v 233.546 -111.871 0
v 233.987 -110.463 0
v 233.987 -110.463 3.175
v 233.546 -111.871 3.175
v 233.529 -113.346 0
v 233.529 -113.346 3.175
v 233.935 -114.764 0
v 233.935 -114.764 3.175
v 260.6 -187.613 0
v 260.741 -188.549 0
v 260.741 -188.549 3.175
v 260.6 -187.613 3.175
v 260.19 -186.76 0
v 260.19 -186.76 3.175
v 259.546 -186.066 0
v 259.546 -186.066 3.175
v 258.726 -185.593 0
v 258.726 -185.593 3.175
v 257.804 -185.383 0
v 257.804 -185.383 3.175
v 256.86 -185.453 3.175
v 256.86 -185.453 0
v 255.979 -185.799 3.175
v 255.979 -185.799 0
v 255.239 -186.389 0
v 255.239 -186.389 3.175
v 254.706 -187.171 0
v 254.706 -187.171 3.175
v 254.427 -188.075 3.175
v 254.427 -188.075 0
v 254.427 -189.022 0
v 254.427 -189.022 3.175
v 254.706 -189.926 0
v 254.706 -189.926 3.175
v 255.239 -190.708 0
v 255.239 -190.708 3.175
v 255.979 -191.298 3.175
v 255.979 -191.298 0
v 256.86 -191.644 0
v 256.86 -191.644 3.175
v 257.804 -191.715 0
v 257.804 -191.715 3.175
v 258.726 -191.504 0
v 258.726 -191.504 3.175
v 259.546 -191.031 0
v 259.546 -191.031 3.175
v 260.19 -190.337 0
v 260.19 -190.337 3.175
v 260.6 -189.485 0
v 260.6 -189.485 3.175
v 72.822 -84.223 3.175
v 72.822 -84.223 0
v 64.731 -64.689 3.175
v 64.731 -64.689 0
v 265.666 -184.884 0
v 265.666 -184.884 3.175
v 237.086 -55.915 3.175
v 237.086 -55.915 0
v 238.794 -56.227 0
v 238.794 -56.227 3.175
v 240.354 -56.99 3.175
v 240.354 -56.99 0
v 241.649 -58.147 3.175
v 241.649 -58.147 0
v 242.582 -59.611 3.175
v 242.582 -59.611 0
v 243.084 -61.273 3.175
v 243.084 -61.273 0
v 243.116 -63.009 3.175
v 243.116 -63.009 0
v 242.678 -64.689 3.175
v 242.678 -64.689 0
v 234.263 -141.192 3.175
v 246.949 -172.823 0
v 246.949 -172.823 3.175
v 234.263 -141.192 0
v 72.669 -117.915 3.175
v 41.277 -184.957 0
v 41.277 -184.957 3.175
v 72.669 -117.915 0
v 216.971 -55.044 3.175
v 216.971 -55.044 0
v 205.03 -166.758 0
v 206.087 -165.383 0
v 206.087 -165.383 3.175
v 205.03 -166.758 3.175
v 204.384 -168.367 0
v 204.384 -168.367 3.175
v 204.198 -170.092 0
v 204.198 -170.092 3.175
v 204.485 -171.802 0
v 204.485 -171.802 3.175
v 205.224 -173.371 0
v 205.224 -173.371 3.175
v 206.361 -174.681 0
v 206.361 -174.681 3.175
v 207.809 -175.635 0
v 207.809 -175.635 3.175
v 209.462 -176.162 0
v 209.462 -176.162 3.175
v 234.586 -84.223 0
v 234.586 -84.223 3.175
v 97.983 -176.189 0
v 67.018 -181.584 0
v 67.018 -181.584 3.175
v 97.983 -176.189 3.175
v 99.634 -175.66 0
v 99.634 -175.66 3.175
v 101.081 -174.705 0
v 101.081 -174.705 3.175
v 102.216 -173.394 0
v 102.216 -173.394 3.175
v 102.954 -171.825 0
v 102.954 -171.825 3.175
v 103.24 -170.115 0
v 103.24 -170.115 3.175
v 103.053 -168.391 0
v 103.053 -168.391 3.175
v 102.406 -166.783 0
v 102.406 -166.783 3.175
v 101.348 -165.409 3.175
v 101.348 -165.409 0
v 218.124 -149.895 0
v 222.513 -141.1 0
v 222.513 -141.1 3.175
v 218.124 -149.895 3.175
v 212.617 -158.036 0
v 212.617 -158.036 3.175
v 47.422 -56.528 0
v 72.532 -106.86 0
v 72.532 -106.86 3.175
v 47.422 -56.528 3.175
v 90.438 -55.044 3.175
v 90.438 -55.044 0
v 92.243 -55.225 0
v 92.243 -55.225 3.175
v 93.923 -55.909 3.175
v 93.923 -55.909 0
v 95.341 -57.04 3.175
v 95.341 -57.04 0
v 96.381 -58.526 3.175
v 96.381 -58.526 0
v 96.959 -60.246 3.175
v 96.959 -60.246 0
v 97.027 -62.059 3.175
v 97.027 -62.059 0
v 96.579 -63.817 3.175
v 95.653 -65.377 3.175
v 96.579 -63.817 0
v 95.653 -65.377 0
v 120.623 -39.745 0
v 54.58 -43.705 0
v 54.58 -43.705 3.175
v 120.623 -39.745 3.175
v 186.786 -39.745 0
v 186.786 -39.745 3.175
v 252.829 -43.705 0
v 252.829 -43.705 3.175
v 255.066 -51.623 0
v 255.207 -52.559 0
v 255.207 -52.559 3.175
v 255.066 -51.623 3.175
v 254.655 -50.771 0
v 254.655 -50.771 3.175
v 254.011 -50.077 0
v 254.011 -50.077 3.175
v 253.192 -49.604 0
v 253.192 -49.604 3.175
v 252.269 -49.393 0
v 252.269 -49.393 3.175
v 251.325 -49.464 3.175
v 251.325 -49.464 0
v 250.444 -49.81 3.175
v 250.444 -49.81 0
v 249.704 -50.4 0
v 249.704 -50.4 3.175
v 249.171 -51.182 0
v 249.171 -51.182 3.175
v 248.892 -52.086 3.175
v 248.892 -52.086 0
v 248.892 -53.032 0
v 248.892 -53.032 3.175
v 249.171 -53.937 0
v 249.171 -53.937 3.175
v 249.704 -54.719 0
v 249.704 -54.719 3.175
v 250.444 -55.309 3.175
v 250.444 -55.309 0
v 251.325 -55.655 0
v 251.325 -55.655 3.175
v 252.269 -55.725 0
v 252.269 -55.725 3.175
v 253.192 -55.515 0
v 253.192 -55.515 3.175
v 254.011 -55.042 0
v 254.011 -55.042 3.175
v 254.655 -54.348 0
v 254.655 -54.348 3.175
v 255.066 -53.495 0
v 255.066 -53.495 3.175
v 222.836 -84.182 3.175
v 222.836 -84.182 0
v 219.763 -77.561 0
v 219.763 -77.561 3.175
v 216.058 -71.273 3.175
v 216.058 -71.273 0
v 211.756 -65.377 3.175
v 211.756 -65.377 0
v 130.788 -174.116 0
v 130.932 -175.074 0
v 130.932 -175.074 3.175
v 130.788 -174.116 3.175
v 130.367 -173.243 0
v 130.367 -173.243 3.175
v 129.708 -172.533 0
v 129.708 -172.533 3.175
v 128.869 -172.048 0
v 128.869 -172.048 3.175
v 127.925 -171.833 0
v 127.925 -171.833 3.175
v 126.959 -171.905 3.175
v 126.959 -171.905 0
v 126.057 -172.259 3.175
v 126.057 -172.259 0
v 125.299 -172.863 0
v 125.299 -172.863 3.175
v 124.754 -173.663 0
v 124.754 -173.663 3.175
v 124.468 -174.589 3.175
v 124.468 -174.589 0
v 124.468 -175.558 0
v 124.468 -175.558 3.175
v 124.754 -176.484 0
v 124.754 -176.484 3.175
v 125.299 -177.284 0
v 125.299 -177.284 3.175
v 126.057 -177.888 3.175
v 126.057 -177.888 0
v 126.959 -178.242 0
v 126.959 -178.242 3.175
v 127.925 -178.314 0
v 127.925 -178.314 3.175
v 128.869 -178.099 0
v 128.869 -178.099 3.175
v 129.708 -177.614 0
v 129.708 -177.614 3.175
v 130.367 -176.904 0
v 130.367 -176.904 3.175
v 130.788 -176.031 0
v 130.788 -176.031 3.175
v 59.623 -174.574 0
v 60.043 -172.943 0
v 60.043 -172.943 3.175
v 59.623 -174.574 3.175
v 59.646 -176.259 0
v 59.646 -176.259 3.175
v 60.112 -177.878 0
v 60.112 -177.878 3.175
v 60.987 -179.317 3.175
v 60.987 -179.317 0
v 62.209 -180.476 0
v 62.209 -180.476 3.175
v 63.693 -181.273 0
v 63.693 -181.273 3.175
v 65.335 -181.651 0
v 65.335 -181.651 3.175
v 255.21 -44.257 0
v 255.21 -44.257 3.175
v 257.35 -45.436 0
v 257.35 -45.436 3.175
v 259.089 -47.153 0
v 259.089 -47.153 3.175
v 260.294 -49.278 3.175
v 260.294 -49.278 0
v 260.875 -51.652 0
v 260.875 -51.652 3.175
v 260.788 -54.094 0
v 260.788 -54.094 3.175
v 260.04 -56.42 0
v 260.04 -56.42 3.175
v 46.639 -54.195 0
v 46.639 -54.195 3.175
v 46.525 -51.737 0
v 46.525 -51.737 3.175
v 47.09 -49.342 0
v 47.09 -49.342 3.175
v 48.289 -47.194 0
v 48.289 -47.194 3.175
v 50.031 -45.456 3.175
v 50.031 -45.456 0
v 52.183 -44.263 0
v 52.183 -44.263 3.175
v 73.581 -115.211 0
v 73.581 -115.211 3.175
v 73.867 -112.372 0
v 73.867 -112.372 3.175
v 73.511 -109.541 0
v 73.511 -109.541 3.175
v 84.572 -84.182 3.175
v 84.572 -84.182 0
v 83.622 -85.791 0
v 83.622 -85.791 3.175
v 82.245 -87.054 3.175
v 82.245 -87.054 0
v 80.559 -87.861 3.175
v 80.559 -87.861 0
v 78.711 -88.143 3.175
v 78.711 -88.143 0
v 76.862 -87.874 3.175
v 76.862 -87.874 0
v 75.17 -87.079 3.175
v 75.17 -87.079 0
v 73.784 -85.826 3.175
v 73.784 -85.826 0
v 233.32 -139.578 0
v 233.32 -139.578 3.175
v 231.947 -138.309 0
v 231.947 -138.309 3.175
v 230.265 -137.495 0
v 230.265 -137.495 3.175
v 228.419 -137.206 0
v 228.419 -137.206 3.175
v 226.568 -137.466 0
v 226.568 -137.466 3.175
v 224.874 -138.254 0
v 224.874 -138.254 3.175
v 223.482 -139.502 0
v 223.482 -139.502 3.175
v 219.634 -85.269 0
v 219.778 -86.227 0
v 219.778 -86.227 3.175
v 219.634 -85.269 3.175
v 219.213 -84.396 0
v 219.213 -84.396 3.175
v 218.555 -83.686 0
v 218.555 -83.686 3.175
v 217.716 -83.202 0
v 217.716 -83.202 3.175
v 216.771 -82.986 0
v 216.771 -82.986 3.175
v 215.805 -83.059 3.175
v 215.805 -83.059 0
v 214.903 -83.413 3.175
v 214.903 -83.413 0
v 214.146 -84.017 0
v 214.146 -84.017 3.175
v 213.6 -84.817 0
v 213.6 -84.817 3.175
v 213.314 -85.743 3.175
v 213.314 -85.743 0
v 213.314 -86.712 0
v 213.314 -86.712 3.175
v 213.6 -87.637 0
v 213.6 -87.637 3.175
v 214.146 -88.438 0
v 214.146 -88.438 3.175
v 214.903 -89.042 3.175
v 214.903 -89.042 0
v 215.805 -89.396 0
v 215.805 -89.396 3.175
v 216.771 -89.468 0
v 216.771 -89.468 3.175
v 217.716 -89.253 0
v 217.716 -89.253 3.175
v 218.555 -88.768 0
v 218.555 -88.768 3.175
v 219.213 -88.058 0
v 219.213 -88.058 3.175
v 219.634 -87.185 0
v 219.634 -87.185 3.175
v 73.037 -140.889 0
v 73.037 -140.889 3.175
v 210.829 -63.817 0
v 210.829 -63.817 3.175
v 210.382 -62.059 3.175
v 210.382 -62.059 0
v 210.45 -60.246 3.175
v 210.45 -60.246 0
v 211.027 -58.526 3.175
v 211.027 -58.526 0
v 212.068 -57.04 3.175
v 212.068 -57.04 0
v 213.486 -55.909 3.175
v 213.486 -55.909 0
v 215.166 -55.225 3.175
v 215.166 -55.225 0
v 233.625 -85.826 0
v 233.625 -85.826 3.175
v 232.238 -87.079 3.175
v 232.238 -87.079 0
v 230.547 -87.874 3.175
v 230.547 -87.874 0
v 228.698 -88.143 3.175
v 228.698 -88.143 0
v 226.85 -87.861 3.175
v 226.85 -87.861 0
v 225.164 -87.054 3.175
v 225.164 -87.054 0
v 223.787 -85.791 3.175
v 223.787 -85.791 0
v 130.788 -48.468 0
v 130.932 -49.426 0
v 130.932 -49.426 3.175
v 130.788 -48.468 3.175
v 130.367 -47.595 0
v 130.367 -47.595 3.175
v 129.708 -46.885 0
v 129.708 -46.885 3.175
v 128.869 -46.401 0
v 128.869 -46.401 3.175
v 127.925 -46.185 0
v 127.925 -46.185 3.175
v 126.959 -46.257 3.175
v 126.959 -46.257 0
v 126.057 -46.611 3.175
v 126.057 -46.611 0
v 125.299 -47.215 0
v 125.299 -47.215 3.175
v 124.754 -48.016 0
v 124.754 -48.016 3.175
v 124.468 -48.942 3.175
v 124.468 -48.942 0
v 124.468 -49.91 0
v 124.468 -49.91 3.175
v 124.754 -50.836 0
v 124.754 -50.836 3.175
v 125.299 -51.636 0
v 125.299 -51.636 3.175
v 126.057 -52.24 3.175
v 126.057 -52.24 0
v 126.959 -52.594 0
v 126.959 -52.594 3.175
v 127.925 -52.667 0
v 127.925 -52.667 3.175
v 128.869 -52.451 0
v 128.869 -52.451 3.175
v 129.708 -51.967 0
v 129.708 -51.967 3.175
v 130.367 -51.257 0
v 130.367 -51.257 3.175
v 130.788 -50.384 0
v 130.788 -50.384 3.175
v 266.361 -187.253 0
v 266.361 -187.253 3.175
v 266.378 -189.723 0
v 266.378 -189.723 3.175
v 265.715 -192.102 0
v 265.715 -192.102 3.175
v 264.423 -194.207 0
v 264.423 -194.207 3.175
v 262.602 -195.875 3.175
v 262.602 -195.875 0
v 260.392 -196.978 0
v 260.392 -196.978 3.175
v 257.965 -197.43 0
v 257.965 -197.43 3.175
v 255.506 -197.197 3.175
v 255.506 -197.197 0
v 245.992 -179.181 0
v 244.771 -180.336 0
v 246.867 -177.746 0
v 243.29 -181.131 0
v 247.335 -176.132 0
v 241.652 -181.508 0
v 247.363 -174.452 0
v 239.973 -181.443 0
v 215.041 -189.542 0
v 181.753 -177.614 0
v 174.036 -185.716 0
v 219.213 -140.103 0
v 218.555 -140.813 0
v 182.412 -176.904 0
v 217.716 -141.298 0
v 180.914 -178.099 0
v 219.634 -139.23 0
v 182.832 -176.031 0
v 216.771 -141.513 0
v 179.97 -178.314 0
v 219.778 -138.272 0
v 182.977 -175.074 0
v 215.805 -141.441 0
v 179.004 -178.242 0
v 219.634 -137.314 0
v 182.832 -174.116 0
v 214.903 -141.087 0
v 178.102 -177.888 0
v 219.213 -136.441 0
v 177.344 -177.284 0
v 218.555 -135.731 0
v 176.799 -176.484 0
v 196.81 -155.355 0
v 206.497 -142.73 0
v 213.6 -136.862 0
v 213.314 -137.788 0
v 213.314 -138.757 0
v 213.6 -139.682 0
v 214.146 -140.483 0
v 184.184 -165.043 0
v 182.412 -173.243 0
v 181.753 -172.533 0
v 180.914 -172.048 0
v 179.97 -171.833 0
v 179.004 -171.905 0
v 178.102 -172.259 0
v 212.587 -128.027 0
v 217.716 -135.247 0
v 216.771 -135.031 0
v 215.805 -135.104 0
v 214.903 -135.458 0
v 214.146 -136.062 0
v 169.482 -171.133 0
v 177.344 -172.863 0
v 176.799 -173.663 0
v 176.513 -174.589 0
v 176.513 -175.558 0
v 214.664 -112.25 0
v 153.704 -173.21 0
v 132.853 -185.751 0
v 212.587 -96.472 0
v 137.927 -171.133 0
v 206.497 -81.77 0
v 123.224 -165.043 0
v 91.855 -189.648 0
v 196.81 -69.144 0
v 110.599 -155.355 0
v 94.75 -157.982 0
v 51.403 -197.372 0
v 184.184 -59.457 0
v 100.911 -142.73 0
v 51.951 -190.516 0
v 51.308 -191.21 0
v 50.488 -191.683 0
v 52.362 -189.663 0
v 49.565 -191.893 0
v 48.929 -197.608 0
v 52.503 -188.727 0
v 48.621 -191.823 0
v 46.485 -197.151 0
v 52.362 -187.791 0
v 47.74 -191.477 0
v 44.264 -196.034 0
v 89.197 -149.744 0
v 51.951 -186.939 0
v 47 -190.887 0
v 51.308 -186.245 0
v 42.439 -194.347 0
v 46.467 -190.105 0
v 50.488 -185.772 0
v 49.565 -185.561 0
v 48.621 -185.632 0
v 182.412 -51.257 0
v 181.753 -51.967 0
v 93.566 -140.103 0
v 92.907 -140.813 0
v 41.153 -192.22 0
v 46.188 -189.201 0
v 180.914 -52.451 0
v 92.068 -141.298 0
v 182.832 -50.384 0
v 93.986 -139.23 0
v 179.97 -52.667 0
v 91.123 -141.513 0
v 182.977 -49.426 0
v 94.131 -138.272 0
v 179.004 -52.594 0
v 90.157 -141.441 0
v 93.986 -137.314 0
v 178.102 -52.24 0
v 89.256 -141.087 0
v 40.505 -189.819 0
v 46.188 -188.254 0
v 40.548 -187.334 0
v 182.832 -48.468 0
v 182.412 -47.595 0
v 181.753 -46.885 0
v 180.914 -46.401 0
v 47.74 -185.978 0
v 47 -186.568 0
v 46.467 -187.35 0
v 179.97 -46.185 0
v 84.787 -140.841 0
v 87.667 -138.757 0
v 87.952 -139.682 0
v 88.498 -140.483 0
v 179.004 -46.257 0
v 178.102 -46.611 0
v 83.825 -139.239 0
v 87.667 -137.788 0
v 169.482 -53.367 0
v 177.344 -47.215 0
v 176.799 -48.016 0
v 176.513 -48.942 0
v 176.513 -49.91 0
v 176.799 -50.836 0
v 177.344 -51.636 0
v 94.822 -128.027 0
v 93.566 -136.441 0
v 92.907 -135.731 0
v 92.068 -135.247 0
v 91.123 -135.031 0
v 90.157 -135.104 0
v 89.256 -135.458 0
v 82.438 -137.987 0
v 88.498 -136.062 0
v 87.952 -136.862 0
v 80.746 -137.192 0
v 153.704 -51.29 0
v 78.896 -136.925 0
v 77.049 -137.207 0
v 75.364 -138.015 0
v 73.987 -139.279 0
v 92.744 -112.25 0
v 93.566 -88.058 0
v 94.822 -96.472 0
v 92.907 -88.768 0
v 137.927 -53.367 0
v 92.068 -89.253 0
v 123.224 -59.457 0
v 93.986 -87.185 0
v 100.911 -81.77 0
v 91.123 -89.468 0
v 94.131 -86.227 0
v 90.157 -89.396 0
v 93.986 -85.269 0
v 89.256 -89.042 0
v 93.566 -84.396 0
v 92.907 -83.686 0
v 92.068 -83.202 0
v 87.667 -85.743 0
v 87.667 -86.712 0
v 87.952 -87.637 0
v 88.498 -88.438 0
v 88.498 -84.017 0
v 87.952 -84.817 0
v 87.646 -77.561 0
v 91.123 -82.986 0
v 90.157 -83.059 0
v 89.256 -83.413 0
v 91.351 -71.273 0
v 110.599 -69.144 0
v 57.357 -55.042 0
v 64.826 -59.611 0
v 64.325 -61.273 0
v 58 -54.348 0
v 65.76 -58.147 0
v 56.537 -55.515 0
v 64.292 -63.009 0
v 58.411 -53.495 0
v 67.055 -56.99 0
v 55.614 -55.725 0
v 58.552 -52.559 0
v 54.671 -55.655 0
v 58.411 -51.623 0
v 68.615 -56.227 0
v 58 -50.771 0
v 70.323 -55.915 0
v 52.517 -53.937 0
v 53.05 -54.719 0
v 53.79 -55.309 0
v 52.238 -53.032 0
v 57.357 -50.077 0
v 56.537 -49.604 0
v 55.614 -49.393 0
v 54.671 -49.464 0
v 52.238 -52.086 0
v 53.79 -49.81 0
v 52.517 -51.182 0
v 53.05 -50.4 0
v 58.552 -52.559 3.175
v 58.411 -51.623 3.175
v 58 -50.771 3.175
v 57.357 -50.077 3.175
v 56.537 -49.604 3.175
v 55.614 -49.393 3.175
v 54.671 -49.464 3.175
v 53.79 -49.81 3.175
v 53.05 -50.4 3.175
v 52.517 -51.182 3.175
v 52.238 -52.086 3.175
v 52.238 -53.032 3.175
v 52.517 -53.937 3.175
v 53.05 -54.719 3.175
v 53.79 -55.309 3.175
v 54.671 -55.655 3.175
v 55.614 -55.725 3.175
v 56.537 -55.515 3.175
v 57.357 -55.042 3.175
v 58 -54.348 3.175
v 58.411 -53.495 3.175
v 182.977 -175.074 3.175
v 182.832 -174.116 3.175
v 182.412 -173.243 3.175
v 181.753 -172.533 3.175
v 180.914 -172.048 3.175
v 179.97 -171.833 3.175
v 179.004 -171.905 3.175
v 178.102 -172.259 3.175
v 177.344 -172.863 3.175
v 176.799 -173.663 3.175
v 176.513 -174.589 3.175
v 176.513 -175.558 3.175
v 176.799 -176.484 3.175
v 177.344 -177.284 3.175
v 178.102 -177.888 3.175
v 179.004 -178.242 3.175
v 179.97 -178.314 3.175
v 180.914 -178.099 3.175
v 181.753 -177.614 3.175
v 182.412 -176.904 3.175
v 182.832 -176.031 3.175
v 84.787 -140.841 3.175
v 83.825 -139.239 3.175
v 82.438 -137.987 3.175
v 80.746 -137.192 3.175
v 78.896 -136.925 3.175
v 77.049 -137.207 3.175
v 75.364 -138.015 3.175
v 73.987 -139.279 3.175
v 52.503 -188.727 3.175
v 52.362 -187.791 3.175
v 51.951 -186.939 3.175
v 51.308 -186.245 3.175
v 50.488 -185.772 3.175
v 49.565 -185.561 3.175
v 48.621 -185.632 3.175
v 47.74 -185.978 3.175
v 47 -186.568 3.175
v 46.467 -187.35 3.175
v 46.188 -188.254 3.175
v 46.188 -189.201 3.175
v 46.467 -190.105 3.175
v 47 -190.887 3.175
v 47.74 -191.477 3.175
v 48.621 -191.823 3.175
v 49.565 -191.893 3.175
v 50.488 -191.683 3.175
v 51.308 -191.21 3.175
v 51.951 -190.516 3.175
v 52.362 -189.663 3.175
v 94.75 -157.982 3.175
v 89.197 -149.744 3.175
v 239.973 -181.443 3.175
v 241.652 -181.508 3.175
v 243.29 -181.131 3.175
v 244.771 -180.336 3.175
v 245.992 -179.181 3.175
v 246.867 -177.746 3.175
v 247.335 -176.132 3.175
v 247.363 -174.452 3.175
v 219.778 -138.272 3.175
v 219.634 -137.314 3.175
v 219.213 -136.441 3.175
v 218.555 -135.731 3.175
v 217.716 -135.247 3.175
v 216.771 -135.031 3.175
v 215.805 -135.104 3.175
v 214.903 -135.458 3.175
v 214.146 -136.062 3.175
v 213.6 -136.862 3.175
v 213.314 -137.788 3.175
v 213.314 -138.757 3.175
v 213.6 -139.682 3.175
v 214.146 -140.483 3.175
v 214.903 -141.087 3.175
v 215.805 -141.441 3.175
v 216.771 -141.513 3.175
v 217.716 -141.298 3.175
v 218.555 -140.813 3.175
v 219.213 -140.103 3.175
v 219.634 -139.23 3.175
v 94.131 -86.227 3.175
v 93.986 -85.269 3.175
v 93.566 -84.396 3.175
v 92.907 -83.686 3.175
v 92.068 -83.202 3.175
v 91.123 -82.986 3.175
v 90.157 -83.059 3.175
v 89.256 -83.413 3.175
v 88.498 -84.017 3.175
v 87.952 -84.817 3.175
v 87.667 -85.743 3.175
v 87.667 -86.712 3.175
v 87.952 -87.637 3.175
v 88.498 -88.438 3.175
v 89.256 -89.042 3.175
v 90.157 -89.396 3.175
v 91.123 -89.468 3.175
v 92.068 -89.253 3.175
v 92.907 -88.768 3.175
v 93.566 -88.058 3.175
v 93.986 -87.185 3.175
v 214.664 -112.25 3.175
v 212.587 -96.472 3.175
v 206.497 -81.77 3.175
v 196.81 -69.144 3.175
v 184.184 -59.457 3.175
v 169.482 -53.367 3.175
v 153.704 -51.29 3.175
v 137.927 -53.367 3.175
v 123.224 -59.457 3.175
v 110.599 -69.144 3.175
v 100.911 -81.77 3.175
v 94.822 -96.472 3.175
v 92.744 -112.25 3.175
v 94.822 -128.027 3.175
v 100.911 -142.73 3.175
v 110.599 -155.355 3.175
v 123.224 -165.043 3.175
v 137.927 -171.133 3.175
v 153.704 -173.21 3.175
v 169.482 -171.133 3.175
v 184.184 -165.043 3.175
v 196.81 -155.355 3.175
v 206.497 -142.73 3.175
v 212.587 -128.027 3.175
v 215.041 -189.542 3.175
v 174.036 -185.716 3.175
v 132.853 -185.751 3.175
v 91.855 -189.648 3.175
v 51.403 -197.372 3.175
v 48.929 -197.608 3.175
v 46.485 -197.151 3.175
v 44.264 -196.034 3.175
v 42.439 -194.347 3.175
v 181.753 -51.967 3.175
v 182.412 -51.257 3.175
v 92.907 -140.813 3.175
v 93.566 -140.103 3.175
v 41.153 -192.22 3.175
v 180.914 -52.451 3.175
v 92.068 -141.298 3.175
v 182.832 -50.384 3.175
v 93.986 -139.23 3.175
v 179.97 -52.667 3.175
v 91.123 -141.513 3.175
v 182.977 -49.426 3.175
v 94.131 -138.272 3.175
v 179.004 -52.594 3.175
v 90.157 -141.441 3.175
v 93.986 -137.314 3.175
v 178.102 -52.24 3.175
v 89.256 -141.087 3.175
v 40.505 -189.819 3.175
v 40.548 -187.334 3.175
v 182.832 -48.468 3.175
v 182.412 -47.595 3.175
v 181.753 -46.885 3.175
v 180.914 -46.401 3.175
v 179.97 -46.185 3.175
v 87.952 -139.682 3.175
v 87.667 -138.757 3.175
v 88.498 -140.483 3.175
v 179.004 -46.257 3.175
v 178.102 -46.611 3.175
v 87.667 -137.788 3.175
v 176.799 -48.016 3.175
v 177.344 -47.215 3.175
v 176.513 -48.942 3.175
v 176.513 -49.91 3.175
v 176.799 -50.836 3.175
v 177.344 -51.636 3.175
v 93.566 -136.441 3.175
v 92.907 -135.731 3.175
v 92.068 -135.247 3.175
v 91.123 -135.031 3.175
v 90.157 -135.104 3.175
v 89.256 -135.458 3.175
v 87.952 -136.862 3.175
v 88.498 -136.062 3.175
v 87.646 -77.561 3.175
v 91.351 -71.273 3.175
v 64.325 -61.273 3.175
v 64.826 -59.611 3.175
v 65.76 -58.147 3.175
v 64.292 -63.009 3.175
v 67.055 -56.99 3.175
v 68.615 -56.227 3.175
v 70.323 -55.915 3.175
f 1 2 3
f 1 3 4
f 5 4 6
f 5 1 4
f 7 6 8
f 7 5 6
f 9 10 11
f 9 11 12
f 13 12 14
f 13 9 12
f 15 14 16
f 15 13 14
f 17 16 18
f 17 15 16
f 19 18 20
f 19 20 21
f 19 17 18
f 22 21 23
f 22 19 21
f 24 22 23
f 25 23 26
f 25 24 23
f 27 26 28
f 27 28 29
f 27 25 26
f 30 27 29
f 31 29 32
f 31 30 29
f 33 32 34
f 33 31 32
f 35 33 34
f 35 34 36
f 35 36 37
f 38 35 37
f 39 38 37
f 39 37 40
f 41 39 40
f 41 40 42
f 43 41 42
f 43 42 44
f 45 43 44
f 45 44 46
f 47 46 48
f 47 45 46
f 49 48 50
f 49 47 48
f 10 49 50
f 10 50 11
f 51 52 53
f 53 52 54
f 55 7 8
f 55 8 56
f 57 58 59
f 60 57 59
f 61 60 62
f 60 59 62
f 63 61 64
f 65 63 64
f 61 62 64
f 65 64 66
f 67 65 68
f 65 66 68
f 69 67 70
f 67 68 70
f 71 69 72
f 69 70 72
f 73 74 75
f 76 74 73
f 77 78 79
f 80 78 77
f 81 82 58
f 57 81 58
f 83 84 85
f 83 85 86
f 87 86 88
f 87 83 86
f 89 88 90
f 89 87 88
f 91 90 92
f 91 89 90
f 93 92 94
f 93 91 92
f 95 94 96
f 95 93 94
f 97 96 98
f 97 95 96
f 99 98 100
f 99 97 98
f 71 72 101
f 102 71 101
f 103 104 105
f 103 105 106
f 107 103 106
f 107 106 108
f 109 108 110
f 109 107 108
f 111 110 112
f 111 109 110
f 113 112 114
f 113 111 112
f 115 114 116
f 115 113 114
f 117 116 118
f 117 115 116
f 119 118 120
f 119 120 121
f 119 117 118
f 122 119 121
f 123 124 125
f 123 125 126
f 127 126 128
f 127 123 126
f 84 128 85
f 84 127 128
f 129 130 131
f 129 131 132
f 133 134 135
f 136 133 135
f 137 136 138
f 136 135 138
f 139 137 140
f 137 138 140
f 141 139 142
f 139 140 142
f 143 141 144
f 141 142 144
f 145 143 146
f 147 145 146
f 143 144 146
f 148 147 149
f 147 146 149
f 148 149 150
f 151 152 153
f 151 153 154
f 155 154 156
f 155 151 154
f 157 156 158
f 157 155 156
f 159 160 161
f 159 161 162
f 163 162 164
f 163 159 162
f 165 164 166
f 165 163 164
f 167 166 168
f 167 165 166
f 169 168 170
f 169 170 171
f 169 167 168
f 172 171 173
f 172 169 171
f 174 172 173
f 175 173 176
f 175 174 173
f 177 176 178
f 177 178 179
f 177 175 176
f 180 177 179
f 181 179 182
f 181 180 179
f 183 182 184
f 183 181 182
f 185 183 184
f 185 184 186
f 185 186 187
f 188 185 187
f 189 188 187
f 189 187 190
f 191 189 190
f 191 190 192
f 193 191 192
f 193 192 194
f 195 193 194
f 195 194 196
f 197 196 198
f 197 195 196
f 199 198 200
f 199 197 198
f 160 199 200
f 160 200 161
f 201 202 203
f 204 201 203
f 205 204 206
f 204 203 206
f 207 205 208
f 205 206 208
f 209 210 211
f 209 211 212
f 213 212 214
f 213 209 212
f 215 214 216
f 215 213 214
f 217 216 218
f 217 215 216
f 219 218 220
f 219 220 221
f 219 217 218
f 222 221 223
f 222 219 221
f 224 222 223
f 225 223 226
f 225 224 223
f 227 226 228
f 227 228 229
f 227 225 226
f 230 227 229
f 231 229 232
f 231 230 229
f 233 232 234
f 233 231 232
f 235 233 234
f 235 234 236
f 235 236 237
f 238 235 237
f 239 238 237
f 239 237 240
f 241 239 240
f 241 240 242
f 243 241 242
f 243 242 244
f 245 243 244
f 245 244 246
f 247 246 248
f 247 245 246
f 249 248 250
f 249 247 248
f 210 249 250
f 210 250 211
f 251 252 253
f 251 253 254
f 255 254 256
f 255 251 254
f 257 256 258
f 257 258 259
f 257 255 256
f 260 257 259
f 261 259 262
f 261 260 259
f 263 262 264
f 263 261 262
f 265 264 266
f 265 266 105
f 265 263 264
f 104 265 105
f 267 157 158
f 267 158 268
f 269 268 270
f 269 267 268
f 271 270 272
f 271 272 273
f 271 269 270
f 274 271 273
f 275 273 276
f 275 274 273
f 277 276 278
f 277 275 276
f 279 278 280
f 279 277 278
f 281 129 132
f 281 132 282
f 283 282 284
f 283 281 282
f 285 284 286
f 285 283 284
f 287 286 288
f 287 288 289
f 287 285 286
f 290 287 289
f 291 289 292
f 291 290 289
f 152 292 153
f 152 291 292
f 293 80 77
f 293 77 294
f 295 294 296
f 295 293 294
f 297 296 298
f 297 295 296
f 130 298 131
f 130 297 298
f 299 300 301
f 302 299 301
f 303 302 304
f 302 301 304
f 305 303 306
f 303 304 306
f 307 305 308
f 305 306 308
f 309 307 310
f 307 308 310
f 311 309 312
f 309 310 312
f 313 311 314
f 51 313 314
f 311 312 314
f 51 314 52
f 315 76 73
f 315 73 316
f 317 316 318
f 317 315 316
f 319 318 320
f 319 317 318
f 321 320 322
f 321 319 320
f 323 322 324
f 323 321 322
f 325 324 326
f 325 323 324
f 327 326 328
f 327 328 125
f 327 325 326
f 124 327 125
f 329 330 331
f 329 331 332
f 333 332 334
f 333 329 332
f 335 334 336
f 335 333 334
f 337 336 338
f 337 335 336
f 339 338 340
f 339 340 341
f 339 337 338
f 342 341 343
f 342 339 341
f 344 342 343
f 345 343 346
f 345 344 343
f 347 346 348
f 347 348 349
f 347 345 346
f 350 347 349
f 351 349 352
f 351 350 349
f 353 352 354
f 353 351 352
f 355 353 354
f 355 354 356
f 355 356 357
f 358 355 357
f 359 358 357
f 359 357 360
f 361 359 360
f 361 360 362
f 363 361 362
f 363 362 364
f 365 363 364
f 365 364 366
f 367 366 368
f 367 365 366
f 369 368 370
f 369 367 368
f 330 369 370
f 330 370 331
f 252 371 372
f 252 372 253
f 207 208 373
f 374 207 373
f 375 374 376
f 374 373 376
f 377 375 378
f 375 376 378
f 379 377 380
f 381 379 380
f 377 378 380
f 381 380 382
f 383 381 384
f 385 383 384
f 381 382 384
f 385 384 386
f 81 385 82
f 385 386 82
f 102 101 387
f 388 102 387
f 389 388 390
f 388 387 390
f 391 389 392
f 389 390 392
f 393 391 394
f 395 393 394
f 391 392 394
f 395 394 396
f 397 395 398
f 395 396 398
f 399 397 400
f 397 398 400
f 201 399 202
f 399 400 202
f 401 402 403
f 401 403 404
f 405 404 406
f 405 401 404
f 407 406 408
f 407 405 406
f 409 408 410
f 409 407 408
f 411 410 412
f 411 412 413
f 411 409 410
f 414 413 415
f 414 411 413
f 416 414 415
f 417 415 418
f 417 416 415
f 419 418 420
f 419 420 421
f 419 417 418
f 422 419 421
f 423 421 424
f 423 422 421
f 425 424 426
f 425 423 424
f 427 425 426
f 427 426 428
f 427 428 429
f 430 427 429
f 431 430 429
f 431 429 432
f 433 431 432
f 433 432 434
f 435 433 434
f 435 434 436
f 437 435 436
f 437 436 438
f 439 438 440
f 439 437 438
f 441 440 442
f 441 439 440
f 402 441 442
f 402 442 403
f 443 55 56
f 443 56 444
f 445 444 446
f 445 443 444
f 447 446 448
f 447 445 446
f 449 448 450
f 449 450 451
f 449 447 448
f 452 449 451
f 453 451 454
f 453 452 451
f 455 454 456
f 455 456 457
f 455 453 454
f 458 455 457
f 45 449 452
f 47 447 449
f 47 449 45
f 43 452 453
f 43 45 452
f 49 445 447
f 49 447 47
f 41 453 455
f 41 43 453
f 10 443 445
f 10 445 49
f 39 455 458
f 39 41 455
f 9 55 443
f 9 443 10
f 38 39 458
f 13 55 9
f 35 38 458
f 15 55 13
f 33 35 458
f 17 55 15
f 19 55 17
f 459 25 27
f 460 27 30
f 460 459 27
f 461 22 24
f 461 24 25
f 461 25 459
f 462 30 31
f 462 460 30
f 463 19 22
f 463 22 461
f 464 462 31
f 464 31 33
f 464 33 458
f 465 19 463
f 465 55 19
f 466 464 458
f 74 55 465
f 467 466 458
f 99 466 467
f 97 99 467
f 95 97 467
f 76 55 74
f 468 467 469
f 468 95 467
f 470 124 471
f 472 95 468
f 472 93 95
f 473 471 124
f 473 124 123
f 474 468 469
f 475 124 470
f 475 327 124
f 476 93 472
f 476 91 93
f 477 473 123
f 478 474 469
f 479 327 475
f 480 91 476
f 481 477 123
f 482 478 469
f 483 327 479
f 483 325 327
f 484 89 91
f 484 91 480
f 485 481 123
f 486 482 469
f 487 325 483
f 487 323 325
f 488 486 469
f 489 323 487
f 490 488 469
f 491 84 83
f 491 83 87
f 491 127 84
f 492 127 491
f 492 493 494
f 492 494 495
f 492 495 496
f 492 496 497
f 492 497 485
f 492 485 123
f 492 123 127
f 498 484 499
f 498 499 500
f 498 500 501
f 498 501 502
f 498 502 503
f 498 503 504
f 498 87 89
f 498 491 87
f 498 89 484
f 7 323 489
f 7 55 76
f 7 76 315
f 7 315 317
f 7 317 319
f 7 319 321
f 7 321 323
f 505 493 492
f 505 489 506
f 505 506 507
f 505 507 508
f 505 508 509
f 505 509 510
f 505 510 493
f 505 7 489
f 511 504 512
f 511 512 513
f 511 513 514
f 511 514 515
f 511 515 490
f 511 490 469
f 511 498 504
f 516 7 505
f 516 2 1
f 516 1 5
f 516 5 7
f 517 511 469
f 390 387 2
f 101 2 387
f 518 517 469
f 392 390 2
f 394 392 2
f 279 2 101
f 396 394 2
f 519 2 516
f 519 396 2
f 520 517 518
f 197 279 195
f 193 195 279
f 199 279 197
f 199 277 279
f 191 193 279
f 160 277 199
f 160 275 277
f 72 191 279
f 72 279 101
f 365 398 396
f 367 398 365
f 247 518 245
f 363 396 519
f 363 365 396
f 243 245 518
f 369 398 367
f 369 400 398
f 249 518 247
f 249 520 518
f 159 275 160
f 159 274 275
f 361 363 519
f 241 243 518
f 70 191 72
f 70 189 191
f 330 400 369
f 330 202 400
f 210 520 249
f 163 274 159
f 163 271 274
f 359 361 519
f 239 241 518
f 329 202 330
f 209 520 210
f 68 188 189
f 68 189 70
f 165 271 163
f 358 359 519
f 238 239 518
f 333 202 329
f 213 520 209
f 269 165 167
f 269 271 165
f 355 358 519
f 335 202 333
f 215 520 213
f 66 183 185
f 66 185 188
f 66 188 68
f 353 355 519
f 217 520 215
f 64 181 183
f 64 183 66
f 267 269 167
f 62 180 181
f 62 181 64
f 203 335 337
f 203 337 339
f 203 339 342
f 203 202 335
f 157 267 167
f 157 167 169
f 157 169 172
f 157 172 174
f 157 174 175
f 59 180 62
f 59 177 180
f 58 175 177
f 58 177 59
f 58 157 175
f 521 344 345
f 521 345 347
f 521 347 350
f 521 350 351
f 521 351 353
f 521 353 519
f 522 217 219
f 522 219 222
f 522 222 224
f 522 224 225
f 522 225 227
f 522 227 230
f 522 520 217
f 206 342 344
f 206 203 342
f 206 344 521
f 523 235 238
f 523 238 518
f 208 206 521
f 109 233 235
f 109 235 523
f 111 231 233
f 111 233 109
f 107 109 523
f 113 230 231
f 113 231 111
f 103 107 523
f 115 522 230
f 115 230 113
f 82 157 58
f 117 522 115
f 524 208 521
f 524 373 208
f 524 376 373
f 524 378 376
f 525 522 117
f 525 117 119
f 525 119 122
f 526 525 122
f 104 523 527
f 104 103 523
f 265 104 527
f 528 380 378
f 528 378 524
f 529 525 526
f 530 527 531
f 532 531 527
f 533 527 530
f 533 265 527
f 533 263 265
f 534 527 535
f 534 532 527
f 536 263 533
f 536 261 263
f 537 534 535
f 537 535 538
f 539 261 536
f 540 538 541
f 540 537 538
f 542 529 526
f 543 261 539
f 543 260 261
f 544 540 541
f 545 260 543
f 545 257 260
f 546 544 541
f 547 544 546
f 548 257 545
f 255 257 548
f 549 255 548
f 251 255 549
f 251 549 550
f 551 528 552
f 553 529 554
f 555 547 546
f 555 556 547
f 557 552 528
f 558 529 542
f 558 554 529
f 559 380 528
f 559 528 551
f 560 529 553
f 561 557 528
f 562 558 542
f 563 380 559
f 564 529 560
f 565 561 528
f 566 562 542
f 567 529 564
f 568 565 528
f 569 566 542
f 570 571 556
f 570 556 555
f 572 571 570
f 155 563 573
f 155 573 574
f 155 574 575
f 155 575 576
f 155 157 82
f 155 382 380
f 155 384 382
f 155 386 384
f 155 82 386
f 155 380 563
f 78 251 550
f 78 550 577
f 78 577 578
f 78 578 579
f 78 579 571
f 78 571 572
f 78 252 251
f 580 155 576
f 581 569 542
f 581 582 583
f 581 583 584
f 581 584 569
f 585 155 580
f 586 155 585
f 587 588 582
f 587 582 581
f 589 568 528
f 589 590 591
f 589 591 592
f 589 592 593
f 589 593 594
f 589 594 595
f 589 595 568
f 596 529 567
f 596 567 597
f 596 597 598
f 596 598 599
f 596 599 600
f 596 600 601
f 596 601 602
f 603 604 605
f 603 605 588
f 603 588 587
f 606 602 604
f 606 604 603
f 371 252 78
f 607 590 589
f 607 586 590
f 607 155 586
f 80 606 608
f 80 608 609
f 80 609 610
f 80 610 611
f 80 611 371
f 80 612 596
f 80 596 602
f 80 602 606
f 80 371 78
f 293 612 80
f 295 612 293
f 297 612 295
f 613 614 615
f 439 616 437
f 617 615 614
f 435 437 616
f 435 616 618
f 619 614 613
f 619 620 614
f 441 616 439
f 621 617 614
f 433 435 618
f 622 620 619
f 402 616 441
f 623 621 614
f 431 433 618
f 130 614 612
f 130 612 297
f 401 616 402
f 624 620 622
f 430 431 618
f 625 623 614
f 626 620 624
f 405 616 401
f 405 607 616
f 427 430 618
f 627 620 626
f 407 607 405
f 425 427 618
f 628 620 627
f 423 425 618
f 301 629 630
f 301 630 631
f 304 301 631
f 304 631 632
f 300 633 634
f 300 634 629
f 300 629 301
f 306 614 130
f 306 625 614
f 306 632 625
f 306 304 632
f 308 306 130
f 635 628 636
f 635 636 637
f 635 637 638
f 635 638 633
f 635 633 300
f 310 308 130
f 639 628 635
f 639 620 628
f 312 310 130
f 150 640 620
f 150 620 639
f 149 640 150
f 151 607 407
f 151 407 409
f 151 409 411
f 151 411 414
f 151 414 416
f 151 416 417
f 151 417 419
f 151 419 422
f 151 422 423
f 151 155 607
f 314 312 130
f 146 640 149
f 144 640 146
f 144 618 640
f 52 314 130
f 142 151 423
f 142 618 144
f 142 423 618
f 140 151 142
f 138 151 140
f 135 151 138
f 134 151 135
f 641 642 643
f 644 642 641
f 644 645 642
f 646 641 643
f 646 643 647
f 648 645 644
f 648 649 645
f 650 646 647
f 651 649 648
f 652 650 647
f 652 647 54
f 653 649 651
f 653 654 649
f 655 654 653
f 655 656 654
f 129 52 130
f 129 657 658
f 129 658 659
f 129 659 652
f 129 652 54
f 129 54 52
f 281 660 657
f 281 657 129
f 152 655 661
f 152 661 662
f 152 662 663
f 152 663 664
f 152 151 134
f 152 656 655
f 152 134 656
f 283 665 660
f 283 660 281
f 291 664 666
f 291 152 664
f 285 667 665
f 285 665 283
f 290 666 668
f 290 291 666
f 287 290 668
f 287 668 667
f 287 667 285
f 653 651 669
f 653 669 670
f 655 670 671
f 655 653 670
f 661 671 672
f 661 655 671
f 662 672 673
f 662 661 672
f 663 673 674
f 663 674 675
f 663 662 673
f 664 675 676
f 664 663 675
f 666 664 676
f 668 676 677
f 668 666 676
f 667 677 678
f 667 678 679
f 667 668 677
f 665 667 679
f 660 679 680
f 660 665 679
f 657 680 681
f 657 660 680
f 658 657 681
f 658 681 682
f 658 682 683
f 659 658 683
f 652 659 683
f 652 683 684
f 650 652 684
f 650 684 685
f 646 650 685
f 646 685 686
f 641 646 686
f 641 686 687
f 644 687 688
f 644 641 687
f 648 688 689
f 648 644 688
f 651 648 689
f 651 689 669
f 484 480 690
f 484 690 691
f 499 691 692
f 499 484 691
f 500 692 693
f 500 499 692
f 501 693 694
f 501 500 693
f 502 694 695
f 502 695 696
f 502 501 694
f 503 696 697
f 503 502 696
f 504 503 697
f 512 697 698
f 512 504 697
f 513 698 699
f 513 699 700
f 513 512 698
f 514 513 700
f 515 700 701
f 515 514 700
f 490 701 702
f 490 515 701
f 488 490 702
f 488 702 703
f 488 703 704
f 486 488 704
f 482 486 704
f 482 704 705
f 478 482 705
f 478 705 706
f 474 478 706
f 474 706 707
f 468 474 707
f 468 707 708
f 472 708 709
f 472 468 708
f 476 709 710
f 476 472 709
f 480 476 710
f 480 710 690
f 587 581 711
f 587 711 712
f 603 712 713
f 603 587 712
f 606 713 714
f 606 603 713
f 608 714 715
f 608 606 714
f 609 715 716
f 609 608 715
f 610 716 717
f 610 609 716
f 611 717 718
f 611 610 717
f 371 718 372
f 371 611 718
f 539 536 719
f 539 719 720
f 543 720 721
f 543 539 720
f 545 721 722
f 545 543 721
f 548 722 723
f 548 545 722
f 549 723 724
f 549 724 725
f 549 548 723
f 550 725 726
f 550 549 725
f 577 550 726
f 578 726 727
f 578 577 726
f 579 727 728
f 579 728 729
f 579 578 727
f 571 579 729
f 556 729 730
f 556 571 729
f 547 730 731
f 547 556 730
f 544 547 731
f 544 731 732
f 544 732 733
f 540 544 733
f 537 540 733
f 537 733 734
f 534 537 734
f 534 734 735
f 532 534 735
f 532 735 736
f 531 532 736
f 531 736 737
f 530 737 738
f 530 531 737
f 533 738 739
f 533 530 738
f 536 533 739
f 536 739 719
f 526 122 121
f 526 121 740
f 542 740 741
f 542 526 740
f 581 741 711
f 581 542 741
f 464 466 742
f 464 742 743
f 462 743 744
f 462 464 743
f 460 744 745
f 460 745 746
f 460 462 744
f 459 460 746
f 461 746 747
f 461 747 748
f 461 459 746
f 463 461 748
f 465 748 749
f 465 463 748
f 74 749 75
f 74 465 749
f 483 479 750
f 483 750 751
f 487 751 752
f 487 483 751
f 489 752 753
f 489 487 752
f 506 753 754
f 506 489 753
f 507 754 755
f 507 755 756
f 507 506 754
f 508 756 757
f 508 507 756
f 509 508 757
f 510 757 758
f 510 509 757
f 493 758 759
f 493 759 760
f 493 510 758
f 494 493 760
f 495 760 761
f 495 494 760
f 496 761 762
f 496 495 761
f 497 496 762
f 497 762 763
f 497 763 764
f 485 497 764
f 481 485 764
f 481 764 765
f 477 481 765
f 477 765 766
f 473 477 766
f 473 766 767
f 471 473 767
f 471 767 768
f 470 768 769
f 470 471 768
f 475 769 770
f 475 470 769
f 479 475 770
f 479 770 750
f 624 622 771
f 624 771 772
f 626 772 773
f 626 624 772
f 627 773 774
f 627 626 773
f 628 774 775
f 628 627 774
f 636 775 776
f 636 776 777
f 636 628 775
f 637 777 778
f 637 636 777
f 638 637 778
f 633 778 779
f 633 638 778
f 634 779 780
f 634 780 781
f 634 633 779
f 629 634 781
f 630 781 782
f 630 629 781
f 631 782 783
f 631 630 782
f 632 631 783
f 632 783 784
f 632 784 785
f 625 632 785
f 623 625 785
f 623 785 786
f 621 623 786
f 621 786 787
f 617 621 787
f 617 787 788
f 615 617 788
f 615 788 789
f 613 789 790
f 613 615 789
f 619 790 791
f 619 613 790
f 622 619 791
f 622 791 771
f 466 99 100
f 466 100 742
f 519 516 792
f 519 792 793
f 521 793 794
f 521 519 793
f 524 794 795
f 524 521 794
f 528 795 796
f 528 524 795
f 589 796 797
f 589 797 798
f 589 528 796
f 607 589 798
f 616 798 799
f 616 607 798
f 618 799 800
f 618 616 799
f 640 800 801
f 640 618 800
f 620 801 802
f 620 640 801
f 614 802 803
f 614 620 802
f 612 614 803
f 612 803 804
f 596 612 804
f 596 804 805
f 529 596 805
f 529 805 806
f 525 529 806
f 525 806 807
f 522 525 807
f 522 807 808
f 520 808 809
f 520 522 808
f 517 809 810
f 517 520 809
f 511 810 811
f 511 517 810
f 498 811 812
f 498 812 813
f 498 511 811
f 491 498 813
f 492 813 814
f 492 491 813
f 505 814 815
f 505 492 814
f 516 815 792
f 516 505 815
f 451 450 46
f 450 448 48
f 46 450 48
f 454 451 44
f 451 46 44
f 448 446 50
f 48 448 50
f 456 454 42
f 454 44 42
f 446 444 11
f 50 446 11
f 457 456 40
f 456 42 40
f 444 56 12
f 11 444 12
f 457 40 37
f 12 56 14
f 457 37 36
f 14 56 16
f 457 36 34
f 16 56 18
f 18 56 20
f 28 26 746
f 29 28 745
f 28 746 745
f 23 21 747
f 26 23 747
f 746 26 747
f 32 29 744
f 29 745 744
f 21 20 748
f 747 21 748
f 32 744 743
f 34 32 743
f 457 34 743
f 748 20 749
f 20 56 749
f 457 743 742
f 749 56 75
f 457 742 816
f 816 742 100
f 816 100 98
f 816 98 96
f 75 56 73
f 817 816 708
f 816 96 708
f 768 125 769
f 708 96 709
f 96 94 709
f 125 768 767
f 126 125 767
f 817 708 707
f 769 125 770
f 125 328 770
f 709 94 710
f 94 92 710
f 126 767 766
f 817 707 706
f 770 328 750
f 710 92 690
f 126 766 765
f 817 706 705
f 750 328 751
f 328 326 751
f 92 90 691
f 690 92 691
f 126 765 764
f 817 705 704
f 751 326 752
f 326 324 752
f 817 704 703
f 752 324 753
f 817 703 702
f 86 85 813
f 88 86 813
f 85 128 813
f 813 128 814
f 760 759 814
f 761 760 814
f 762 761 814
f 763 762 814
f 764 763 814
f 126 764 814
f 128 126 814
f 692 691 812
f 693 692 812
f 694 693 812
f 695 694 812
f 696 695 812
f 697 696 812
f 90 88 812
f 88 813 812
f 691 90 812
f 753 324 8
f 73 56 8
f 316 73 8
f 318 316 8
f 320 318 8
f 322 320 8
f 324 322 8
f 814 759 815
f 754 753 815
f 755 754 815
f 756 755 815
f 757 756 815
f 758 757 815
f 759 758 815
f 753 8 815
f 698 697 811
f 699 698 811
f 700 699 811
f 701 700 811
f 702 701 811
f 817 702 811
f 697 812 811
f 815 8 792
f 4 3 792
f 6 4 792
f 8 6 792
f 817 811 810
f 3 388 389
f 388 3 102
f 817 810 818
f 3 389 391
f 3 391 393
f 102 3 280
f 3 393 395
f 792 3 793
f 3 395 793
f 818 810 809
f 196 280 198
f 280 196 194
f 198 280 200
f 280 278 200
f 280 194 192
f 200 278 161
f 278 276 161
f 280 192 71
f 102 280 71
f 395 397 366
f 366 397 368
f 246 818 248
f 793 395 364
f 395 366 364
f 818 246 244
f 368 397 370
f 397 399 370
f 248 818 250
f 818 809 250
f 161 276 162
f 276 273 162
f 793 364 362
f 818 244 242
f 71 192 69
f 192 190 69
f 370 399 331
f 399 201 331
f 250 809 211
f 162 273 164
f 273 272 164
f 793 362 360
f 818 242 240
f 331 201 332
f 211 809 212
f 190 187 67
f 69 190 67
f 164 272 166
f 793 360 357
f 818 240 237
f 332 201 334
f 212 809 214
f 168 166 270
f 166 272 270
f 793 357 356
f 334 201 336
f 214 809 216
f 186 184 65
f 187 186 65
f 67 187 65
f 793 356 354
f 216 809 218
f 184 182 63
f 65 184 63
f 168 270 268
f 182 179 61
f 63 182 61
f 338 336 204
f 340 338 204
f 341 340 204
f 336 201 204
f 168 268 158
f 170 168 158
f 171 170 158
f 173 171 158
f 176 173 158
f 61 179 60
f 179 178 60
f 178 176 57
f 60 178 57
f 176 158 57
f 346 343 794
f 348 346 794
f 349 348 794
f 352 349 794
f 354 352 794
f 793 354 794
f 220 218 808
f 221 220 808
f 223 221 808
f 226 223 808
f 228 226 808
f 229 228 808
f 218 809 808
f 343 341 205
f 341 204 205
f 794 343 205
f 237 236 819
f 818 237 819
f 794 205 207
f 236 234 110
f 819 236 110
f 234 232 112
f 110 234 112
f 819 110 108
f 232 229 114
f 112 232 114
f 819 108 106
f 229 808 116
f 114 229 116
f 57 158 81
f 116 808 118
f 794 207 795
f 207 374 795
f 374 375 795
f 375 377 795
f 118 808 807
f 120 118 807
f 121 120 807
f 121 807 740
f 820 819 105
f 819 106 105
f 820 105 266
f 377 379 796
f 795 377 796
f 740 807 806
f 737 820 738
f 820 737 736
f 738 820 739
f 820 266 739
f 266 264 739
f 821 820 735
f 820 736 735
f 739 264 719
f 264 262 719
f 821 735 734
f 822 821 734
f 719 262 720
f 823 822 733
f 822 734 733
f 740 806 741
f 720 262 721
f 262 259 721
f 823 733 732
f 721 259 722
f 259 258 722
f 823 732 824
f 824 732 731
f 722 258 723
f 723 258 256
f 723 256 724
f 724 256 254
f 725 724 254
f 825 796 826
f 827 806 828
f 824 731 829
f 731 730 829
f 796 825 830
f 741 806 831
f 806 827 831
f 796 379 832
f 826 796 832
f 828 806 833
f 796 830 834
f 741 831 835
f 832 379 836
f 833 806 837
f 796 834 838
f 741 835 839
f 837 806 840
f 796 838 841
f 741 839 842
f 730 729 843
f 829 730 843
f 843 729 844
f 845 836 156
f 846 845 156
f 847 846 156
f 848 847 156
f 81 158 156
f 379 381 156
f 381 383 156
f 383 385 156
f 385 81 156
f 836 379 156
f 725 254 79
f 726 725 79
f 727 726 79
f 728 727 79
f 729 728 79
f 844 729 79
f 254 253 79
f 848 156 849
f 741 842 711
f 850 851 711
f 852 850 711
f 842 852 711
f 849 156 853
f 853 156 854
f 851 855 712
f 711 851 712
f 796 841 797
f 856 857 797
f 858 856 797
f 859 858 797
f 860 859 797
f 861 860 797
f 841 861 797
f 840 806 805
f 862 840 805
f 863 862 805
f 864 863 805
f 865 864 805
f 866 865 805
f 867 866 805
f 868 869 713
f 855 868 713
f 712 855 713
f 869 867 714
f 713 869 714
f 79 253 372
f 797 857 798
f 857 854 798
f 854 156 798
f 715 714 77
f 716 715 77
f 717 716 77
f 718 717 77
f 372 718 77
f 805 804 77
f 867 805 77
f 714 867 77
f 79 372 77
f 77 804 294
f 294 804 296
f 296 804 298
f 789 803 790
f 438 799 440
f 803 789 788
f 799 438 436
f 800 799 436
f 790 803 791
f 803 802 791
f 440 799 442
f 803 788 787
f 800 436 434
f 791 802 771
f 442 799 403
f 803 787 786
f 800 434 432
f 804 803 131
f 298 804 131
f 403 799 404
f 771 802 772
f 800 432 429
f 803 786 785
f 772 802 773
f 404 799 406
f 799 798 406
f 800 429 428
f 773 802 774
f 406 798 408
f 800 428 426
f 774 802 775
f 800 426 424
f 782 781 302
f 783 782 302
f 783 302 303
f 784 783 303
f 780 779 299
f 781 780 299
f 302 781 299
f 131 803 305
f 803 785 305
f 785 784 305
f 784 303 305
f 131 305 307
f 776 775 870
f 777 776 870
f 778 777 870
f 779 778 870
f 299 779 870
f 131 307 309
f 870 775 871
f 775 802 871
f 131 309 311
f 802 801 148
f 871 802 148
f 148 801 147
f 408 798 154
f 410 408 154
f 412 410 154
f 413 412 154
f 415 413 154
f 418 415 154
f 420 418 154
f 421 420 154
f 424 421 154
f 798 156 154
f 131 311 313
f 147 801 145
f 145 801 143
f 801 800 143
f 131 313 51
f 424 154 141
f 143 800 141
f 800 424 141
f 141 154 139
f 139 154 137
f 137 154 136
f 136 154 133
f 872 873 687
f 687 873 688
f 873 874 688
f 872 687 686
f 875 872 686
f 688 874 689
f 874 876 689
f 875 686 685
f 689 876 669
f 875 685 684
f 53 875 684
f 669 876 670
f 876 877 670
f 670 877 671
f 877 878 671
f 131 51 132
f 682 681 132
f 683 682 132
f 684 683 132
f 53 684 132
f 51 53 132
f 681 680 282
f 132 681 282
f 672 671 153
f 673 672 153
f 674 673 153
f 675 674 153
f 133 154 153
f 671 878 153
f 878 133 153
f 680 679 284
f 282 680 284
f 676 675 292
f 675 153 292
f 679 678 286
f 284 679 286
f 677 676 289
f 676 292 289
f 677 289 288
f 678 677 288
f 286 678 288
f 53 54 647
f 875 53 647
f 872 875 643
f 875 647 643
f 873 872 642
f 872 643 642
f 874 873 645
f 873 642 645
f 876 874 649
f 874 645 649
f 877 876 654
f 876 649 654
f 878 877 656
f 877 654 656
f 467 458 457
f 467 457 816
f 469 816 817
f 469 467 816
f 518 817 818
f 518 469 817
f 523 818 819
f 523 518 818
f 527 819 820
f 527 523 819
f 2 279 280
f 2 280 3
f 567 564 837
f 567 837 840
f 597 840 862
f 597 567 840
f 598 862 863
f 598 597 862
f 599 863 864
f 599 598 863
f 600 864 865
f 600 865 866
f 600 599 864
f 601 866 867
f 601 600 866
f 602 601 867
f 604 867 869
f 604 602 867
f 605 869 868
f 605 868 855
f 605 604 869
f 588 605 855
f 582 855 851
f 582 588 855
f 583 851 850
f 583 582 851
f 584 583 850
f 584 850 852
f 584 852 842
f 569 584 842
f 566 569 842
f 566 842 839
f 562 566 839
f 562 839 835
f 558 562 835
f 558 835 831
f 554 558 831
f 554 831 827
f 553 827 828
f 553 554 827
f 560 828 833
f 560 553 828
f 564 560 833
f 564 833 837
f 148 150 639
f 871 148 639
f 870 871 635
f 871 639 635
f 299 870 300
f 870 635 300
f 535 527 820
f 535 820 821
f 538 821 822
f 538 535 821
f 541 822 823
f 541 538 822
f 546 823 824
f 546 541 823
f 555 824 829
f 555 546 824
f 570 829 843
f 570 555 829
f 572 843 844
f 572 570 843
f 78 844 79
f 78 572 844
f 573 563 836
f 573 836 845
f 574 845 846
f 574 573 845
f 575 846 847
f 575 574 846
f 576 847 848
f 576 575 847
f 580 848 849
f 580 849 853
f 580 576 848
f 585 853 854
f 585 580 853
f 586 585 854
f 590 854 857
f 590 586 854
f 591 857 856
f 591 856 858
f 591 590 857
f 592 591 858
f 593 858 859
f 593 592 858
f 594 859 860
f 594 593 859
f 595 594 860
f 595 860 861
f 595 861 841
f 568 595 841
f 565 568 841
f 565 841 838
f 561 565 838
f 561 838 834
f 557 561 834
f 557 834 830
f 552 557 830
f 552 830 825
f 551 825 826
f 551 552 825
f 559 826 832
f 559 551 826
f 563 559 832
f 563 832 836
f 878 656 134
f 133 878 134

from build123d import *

# Parameters (mm, degrees)
SKETCH5_R           = 3.175
SKETCH5_R_2         = 3.25
SKETCH5_R_3         = 60.96
BOSS_EXTRUDE2_DEPTH = 3.175


with BuildPart() as part:
    # Sketch5 → Boss-Extrude2 (new body)
    with BuildSketch(Plane.XY):
        with BuildLine():
            Line((233.935091571, -114.763518579), (265.665701875, -184.883595476))
            ThreePointArc((265.665701875, -184.883595476), (264.423436425, -194.206670618), (255.505854783, -197.196602259))
            ThreePointArc((255.505854783, -197.196602259), (153.444246818, -185.249846144), (51.403286659, -197.37169633))
            ThreePointArc((51.403286659, -197.37169633), (42.43911219, -194.346602456), (41.276859828, -184.957417917))
            Line((41.276859828, -184.957417917), (72.669263517, -117.915407124))
            ThreePointArc((72.669263517, -117.915407124), (73.866746362, -112.37217505), (72.532031625, -106.860376473))
            Line((72.532031625, -106.860376473), (47.422094343, -56.527870305))
            ThreePointArc((47.422094343, -56.527870305), (47.614528636, -48.22631495), (54.579553655, -43.705111707))
            ThreePointArc((54.579553655, -43.705111707), (153.704366218, -39.249697911), (252.829178781, -43.705111707))
            ThreePointArc((252.829178781, -43.705111707), (259.764657482, -48.173800982), (260.039703094, -56.419672588))
            Line((260.039703094, -56.419672588), (233.987235662, -110.463230544))
            ThreePointArc((233.987235662, -110.463230544), (233.48365469, -112.607584422), (233.935091571, -114.763518579))
        make_face()
        with Locations((49.32793696, -188.727332639)):
            Circle(SKETCH5_R, mode=Mode.SUBTRACT)
        with Locations((55.377109151, -52.559263571)):
            Circle(SKETCH5_R, mode=Mode.SUBTRACT)
        with Locations((252.031623286, -52.559263571)):
            Circle(SKETCH5_R, mode=Mode.SUBTRACT)
        with Locations((90.880558007, -138.272171312)):
            Circle(SKETCH5_R_2, mode=Mode.SUBTRACT)
        with Locations((127.681892817, -175.073506122)):
            Circle(SKETCH5_R_2, mode=Mode.SUBTRACT)
        with Locations((179.726839619, -175.073506122)):
            Circle(SKETCH5_R_2, mode=Mode.SUBTRACT)
        with Locations((216.528174429, -138.272171312)):
            Circle(SKETCH5_R_2, mode=Mode.SUBTRACT)
        with Locations((216.528174429, -86.227224511)):
            Circle(SKETCH5_R_2, mode=Mode.SUBTRACT)
        with Locations((179.726839619, -49.425889701)):
            Circle(SKETCH5_R_2, mode=Mode.SUBTRACT)
        with Locations((127.681892817, -49.425889701)):
            Circle(SKETCH5_R_2, mode=Mode.SUBTRACT)
        with Locations((90.880558007, -86.227224511)):
            Circle(SKETCH5_R_2, mode=Mode.SUBTRACT)
        with Locations((153.704366218, -112.249697911)):
            Circle(SKETCH5_R_3, mode=Mode.SUBTRACT)
        with Locations((257.566369908, -188.548690521)):
            Circle(SKETCH5_R, mode=Mode.SUBTRACT)
        with BuildLine():
            Line((209.461649294, -176.161550354), (239.97260378, -181.443451933))
            ThreePointArc((239.97260378, -181.443451933), (245.991796239, -179.18128426), (246.949420177, -172.822743797))
            Line((246.949420177, -172.822743797), (234.263108846, -141.191675264))
            ThreePointArc((234.263108846, -141.191675264), (228.418953488, -137.205640522), (222.513375511, -141.100094727))
            ThreePointArc((222.513375511, -141.100094727), (215.504437403, -154.056113183), (206.086743584, -165.382660352))
            ThreePointArc((206.086743584, -165.382660352), (204.484912095, -171.801991039), (209.461649294, -176.161550354))
        make_face(mode=Mode.SUBTRACT)
        with BuildLine():
            Line((216.971221053, -55.043652894), (237.085867612, -55.91533392))
            ThreePointArc((237.085867612, -55.91533392), (242.165926056, -58.84665781), (242.677579376, -64.689419522))
            Line((242.677579376, -64.689419522), (234.586463913, -84.223100209))
            ThreePointArc((234.586463913, -84.223100209), (228.697518519, -88.14302122), (222.836263182, -84.181816295))
            ThreePointArc((222.836263182, -84.181816295), (217.987361181, -74.371977351), (211.755754133, -65.37687511))
            ThreePointArc((211.755754133, -65.37687511), (211.027446603, -58.526470596), (216.971221053, -55.043652894))
        make_face(mode=Mode.SUBTRACT)
        with BuildLine():
            Line((67.017865041, -181.584438257), (97.982666146, -176.188564905))
            ThreePointArc((97.982666146, -176.188564905), (102.953981644, -171.82534341), (101.348381832, -165.40866757))
            ThreePointArc((101.348381832, -165.40866757), (91.836215085, -153.955297436), (84.787438766, -140.841344712))
            ThreePointArc((84.787438766, -140.841344712), (78.896402882, -136.924728627), (73.037344469, -140.889021736))
            Line((73.037344469, -140.889021736), (60.042928393, -172.943053933))
            ThreePointArc((60.042928393, -172.943053933), (60.98652829, -179.31704224), (67.017865041, -181.584438257))
        make_face(mode=Mode.SUBTRACT)
        with BuildLine():
            Line((70.322864824, -55.91533392), (90.437511384, -55.043652894))
            ThreePointArc((90.437511384, -55.043652894), (96.381285834, -58.526470596), (95.652978303, -65.37687511))
            ThreePointArc((95.652978303, -65.37687511), (89.421371255, -74.371977351), (84.572469254, -84.181816295))
            ThreePointArc((84.572469254, -84.181816295), (78.711213917, -88.14302122), (72.822268524, -84.223100209))
            Line((72.822268524, -84.223100209), (64.73115306, -64.689419522))
            ThreePointArc((64.73115306, -64.689419522), (65.242806381, -58.84665781), (70.322864824, -55.91533392))
        make_face(mode=Mode.SUBTRACT)
    extrude(amount=BOSS_EXTRUDE2_DEPTH)


solid = part.part
